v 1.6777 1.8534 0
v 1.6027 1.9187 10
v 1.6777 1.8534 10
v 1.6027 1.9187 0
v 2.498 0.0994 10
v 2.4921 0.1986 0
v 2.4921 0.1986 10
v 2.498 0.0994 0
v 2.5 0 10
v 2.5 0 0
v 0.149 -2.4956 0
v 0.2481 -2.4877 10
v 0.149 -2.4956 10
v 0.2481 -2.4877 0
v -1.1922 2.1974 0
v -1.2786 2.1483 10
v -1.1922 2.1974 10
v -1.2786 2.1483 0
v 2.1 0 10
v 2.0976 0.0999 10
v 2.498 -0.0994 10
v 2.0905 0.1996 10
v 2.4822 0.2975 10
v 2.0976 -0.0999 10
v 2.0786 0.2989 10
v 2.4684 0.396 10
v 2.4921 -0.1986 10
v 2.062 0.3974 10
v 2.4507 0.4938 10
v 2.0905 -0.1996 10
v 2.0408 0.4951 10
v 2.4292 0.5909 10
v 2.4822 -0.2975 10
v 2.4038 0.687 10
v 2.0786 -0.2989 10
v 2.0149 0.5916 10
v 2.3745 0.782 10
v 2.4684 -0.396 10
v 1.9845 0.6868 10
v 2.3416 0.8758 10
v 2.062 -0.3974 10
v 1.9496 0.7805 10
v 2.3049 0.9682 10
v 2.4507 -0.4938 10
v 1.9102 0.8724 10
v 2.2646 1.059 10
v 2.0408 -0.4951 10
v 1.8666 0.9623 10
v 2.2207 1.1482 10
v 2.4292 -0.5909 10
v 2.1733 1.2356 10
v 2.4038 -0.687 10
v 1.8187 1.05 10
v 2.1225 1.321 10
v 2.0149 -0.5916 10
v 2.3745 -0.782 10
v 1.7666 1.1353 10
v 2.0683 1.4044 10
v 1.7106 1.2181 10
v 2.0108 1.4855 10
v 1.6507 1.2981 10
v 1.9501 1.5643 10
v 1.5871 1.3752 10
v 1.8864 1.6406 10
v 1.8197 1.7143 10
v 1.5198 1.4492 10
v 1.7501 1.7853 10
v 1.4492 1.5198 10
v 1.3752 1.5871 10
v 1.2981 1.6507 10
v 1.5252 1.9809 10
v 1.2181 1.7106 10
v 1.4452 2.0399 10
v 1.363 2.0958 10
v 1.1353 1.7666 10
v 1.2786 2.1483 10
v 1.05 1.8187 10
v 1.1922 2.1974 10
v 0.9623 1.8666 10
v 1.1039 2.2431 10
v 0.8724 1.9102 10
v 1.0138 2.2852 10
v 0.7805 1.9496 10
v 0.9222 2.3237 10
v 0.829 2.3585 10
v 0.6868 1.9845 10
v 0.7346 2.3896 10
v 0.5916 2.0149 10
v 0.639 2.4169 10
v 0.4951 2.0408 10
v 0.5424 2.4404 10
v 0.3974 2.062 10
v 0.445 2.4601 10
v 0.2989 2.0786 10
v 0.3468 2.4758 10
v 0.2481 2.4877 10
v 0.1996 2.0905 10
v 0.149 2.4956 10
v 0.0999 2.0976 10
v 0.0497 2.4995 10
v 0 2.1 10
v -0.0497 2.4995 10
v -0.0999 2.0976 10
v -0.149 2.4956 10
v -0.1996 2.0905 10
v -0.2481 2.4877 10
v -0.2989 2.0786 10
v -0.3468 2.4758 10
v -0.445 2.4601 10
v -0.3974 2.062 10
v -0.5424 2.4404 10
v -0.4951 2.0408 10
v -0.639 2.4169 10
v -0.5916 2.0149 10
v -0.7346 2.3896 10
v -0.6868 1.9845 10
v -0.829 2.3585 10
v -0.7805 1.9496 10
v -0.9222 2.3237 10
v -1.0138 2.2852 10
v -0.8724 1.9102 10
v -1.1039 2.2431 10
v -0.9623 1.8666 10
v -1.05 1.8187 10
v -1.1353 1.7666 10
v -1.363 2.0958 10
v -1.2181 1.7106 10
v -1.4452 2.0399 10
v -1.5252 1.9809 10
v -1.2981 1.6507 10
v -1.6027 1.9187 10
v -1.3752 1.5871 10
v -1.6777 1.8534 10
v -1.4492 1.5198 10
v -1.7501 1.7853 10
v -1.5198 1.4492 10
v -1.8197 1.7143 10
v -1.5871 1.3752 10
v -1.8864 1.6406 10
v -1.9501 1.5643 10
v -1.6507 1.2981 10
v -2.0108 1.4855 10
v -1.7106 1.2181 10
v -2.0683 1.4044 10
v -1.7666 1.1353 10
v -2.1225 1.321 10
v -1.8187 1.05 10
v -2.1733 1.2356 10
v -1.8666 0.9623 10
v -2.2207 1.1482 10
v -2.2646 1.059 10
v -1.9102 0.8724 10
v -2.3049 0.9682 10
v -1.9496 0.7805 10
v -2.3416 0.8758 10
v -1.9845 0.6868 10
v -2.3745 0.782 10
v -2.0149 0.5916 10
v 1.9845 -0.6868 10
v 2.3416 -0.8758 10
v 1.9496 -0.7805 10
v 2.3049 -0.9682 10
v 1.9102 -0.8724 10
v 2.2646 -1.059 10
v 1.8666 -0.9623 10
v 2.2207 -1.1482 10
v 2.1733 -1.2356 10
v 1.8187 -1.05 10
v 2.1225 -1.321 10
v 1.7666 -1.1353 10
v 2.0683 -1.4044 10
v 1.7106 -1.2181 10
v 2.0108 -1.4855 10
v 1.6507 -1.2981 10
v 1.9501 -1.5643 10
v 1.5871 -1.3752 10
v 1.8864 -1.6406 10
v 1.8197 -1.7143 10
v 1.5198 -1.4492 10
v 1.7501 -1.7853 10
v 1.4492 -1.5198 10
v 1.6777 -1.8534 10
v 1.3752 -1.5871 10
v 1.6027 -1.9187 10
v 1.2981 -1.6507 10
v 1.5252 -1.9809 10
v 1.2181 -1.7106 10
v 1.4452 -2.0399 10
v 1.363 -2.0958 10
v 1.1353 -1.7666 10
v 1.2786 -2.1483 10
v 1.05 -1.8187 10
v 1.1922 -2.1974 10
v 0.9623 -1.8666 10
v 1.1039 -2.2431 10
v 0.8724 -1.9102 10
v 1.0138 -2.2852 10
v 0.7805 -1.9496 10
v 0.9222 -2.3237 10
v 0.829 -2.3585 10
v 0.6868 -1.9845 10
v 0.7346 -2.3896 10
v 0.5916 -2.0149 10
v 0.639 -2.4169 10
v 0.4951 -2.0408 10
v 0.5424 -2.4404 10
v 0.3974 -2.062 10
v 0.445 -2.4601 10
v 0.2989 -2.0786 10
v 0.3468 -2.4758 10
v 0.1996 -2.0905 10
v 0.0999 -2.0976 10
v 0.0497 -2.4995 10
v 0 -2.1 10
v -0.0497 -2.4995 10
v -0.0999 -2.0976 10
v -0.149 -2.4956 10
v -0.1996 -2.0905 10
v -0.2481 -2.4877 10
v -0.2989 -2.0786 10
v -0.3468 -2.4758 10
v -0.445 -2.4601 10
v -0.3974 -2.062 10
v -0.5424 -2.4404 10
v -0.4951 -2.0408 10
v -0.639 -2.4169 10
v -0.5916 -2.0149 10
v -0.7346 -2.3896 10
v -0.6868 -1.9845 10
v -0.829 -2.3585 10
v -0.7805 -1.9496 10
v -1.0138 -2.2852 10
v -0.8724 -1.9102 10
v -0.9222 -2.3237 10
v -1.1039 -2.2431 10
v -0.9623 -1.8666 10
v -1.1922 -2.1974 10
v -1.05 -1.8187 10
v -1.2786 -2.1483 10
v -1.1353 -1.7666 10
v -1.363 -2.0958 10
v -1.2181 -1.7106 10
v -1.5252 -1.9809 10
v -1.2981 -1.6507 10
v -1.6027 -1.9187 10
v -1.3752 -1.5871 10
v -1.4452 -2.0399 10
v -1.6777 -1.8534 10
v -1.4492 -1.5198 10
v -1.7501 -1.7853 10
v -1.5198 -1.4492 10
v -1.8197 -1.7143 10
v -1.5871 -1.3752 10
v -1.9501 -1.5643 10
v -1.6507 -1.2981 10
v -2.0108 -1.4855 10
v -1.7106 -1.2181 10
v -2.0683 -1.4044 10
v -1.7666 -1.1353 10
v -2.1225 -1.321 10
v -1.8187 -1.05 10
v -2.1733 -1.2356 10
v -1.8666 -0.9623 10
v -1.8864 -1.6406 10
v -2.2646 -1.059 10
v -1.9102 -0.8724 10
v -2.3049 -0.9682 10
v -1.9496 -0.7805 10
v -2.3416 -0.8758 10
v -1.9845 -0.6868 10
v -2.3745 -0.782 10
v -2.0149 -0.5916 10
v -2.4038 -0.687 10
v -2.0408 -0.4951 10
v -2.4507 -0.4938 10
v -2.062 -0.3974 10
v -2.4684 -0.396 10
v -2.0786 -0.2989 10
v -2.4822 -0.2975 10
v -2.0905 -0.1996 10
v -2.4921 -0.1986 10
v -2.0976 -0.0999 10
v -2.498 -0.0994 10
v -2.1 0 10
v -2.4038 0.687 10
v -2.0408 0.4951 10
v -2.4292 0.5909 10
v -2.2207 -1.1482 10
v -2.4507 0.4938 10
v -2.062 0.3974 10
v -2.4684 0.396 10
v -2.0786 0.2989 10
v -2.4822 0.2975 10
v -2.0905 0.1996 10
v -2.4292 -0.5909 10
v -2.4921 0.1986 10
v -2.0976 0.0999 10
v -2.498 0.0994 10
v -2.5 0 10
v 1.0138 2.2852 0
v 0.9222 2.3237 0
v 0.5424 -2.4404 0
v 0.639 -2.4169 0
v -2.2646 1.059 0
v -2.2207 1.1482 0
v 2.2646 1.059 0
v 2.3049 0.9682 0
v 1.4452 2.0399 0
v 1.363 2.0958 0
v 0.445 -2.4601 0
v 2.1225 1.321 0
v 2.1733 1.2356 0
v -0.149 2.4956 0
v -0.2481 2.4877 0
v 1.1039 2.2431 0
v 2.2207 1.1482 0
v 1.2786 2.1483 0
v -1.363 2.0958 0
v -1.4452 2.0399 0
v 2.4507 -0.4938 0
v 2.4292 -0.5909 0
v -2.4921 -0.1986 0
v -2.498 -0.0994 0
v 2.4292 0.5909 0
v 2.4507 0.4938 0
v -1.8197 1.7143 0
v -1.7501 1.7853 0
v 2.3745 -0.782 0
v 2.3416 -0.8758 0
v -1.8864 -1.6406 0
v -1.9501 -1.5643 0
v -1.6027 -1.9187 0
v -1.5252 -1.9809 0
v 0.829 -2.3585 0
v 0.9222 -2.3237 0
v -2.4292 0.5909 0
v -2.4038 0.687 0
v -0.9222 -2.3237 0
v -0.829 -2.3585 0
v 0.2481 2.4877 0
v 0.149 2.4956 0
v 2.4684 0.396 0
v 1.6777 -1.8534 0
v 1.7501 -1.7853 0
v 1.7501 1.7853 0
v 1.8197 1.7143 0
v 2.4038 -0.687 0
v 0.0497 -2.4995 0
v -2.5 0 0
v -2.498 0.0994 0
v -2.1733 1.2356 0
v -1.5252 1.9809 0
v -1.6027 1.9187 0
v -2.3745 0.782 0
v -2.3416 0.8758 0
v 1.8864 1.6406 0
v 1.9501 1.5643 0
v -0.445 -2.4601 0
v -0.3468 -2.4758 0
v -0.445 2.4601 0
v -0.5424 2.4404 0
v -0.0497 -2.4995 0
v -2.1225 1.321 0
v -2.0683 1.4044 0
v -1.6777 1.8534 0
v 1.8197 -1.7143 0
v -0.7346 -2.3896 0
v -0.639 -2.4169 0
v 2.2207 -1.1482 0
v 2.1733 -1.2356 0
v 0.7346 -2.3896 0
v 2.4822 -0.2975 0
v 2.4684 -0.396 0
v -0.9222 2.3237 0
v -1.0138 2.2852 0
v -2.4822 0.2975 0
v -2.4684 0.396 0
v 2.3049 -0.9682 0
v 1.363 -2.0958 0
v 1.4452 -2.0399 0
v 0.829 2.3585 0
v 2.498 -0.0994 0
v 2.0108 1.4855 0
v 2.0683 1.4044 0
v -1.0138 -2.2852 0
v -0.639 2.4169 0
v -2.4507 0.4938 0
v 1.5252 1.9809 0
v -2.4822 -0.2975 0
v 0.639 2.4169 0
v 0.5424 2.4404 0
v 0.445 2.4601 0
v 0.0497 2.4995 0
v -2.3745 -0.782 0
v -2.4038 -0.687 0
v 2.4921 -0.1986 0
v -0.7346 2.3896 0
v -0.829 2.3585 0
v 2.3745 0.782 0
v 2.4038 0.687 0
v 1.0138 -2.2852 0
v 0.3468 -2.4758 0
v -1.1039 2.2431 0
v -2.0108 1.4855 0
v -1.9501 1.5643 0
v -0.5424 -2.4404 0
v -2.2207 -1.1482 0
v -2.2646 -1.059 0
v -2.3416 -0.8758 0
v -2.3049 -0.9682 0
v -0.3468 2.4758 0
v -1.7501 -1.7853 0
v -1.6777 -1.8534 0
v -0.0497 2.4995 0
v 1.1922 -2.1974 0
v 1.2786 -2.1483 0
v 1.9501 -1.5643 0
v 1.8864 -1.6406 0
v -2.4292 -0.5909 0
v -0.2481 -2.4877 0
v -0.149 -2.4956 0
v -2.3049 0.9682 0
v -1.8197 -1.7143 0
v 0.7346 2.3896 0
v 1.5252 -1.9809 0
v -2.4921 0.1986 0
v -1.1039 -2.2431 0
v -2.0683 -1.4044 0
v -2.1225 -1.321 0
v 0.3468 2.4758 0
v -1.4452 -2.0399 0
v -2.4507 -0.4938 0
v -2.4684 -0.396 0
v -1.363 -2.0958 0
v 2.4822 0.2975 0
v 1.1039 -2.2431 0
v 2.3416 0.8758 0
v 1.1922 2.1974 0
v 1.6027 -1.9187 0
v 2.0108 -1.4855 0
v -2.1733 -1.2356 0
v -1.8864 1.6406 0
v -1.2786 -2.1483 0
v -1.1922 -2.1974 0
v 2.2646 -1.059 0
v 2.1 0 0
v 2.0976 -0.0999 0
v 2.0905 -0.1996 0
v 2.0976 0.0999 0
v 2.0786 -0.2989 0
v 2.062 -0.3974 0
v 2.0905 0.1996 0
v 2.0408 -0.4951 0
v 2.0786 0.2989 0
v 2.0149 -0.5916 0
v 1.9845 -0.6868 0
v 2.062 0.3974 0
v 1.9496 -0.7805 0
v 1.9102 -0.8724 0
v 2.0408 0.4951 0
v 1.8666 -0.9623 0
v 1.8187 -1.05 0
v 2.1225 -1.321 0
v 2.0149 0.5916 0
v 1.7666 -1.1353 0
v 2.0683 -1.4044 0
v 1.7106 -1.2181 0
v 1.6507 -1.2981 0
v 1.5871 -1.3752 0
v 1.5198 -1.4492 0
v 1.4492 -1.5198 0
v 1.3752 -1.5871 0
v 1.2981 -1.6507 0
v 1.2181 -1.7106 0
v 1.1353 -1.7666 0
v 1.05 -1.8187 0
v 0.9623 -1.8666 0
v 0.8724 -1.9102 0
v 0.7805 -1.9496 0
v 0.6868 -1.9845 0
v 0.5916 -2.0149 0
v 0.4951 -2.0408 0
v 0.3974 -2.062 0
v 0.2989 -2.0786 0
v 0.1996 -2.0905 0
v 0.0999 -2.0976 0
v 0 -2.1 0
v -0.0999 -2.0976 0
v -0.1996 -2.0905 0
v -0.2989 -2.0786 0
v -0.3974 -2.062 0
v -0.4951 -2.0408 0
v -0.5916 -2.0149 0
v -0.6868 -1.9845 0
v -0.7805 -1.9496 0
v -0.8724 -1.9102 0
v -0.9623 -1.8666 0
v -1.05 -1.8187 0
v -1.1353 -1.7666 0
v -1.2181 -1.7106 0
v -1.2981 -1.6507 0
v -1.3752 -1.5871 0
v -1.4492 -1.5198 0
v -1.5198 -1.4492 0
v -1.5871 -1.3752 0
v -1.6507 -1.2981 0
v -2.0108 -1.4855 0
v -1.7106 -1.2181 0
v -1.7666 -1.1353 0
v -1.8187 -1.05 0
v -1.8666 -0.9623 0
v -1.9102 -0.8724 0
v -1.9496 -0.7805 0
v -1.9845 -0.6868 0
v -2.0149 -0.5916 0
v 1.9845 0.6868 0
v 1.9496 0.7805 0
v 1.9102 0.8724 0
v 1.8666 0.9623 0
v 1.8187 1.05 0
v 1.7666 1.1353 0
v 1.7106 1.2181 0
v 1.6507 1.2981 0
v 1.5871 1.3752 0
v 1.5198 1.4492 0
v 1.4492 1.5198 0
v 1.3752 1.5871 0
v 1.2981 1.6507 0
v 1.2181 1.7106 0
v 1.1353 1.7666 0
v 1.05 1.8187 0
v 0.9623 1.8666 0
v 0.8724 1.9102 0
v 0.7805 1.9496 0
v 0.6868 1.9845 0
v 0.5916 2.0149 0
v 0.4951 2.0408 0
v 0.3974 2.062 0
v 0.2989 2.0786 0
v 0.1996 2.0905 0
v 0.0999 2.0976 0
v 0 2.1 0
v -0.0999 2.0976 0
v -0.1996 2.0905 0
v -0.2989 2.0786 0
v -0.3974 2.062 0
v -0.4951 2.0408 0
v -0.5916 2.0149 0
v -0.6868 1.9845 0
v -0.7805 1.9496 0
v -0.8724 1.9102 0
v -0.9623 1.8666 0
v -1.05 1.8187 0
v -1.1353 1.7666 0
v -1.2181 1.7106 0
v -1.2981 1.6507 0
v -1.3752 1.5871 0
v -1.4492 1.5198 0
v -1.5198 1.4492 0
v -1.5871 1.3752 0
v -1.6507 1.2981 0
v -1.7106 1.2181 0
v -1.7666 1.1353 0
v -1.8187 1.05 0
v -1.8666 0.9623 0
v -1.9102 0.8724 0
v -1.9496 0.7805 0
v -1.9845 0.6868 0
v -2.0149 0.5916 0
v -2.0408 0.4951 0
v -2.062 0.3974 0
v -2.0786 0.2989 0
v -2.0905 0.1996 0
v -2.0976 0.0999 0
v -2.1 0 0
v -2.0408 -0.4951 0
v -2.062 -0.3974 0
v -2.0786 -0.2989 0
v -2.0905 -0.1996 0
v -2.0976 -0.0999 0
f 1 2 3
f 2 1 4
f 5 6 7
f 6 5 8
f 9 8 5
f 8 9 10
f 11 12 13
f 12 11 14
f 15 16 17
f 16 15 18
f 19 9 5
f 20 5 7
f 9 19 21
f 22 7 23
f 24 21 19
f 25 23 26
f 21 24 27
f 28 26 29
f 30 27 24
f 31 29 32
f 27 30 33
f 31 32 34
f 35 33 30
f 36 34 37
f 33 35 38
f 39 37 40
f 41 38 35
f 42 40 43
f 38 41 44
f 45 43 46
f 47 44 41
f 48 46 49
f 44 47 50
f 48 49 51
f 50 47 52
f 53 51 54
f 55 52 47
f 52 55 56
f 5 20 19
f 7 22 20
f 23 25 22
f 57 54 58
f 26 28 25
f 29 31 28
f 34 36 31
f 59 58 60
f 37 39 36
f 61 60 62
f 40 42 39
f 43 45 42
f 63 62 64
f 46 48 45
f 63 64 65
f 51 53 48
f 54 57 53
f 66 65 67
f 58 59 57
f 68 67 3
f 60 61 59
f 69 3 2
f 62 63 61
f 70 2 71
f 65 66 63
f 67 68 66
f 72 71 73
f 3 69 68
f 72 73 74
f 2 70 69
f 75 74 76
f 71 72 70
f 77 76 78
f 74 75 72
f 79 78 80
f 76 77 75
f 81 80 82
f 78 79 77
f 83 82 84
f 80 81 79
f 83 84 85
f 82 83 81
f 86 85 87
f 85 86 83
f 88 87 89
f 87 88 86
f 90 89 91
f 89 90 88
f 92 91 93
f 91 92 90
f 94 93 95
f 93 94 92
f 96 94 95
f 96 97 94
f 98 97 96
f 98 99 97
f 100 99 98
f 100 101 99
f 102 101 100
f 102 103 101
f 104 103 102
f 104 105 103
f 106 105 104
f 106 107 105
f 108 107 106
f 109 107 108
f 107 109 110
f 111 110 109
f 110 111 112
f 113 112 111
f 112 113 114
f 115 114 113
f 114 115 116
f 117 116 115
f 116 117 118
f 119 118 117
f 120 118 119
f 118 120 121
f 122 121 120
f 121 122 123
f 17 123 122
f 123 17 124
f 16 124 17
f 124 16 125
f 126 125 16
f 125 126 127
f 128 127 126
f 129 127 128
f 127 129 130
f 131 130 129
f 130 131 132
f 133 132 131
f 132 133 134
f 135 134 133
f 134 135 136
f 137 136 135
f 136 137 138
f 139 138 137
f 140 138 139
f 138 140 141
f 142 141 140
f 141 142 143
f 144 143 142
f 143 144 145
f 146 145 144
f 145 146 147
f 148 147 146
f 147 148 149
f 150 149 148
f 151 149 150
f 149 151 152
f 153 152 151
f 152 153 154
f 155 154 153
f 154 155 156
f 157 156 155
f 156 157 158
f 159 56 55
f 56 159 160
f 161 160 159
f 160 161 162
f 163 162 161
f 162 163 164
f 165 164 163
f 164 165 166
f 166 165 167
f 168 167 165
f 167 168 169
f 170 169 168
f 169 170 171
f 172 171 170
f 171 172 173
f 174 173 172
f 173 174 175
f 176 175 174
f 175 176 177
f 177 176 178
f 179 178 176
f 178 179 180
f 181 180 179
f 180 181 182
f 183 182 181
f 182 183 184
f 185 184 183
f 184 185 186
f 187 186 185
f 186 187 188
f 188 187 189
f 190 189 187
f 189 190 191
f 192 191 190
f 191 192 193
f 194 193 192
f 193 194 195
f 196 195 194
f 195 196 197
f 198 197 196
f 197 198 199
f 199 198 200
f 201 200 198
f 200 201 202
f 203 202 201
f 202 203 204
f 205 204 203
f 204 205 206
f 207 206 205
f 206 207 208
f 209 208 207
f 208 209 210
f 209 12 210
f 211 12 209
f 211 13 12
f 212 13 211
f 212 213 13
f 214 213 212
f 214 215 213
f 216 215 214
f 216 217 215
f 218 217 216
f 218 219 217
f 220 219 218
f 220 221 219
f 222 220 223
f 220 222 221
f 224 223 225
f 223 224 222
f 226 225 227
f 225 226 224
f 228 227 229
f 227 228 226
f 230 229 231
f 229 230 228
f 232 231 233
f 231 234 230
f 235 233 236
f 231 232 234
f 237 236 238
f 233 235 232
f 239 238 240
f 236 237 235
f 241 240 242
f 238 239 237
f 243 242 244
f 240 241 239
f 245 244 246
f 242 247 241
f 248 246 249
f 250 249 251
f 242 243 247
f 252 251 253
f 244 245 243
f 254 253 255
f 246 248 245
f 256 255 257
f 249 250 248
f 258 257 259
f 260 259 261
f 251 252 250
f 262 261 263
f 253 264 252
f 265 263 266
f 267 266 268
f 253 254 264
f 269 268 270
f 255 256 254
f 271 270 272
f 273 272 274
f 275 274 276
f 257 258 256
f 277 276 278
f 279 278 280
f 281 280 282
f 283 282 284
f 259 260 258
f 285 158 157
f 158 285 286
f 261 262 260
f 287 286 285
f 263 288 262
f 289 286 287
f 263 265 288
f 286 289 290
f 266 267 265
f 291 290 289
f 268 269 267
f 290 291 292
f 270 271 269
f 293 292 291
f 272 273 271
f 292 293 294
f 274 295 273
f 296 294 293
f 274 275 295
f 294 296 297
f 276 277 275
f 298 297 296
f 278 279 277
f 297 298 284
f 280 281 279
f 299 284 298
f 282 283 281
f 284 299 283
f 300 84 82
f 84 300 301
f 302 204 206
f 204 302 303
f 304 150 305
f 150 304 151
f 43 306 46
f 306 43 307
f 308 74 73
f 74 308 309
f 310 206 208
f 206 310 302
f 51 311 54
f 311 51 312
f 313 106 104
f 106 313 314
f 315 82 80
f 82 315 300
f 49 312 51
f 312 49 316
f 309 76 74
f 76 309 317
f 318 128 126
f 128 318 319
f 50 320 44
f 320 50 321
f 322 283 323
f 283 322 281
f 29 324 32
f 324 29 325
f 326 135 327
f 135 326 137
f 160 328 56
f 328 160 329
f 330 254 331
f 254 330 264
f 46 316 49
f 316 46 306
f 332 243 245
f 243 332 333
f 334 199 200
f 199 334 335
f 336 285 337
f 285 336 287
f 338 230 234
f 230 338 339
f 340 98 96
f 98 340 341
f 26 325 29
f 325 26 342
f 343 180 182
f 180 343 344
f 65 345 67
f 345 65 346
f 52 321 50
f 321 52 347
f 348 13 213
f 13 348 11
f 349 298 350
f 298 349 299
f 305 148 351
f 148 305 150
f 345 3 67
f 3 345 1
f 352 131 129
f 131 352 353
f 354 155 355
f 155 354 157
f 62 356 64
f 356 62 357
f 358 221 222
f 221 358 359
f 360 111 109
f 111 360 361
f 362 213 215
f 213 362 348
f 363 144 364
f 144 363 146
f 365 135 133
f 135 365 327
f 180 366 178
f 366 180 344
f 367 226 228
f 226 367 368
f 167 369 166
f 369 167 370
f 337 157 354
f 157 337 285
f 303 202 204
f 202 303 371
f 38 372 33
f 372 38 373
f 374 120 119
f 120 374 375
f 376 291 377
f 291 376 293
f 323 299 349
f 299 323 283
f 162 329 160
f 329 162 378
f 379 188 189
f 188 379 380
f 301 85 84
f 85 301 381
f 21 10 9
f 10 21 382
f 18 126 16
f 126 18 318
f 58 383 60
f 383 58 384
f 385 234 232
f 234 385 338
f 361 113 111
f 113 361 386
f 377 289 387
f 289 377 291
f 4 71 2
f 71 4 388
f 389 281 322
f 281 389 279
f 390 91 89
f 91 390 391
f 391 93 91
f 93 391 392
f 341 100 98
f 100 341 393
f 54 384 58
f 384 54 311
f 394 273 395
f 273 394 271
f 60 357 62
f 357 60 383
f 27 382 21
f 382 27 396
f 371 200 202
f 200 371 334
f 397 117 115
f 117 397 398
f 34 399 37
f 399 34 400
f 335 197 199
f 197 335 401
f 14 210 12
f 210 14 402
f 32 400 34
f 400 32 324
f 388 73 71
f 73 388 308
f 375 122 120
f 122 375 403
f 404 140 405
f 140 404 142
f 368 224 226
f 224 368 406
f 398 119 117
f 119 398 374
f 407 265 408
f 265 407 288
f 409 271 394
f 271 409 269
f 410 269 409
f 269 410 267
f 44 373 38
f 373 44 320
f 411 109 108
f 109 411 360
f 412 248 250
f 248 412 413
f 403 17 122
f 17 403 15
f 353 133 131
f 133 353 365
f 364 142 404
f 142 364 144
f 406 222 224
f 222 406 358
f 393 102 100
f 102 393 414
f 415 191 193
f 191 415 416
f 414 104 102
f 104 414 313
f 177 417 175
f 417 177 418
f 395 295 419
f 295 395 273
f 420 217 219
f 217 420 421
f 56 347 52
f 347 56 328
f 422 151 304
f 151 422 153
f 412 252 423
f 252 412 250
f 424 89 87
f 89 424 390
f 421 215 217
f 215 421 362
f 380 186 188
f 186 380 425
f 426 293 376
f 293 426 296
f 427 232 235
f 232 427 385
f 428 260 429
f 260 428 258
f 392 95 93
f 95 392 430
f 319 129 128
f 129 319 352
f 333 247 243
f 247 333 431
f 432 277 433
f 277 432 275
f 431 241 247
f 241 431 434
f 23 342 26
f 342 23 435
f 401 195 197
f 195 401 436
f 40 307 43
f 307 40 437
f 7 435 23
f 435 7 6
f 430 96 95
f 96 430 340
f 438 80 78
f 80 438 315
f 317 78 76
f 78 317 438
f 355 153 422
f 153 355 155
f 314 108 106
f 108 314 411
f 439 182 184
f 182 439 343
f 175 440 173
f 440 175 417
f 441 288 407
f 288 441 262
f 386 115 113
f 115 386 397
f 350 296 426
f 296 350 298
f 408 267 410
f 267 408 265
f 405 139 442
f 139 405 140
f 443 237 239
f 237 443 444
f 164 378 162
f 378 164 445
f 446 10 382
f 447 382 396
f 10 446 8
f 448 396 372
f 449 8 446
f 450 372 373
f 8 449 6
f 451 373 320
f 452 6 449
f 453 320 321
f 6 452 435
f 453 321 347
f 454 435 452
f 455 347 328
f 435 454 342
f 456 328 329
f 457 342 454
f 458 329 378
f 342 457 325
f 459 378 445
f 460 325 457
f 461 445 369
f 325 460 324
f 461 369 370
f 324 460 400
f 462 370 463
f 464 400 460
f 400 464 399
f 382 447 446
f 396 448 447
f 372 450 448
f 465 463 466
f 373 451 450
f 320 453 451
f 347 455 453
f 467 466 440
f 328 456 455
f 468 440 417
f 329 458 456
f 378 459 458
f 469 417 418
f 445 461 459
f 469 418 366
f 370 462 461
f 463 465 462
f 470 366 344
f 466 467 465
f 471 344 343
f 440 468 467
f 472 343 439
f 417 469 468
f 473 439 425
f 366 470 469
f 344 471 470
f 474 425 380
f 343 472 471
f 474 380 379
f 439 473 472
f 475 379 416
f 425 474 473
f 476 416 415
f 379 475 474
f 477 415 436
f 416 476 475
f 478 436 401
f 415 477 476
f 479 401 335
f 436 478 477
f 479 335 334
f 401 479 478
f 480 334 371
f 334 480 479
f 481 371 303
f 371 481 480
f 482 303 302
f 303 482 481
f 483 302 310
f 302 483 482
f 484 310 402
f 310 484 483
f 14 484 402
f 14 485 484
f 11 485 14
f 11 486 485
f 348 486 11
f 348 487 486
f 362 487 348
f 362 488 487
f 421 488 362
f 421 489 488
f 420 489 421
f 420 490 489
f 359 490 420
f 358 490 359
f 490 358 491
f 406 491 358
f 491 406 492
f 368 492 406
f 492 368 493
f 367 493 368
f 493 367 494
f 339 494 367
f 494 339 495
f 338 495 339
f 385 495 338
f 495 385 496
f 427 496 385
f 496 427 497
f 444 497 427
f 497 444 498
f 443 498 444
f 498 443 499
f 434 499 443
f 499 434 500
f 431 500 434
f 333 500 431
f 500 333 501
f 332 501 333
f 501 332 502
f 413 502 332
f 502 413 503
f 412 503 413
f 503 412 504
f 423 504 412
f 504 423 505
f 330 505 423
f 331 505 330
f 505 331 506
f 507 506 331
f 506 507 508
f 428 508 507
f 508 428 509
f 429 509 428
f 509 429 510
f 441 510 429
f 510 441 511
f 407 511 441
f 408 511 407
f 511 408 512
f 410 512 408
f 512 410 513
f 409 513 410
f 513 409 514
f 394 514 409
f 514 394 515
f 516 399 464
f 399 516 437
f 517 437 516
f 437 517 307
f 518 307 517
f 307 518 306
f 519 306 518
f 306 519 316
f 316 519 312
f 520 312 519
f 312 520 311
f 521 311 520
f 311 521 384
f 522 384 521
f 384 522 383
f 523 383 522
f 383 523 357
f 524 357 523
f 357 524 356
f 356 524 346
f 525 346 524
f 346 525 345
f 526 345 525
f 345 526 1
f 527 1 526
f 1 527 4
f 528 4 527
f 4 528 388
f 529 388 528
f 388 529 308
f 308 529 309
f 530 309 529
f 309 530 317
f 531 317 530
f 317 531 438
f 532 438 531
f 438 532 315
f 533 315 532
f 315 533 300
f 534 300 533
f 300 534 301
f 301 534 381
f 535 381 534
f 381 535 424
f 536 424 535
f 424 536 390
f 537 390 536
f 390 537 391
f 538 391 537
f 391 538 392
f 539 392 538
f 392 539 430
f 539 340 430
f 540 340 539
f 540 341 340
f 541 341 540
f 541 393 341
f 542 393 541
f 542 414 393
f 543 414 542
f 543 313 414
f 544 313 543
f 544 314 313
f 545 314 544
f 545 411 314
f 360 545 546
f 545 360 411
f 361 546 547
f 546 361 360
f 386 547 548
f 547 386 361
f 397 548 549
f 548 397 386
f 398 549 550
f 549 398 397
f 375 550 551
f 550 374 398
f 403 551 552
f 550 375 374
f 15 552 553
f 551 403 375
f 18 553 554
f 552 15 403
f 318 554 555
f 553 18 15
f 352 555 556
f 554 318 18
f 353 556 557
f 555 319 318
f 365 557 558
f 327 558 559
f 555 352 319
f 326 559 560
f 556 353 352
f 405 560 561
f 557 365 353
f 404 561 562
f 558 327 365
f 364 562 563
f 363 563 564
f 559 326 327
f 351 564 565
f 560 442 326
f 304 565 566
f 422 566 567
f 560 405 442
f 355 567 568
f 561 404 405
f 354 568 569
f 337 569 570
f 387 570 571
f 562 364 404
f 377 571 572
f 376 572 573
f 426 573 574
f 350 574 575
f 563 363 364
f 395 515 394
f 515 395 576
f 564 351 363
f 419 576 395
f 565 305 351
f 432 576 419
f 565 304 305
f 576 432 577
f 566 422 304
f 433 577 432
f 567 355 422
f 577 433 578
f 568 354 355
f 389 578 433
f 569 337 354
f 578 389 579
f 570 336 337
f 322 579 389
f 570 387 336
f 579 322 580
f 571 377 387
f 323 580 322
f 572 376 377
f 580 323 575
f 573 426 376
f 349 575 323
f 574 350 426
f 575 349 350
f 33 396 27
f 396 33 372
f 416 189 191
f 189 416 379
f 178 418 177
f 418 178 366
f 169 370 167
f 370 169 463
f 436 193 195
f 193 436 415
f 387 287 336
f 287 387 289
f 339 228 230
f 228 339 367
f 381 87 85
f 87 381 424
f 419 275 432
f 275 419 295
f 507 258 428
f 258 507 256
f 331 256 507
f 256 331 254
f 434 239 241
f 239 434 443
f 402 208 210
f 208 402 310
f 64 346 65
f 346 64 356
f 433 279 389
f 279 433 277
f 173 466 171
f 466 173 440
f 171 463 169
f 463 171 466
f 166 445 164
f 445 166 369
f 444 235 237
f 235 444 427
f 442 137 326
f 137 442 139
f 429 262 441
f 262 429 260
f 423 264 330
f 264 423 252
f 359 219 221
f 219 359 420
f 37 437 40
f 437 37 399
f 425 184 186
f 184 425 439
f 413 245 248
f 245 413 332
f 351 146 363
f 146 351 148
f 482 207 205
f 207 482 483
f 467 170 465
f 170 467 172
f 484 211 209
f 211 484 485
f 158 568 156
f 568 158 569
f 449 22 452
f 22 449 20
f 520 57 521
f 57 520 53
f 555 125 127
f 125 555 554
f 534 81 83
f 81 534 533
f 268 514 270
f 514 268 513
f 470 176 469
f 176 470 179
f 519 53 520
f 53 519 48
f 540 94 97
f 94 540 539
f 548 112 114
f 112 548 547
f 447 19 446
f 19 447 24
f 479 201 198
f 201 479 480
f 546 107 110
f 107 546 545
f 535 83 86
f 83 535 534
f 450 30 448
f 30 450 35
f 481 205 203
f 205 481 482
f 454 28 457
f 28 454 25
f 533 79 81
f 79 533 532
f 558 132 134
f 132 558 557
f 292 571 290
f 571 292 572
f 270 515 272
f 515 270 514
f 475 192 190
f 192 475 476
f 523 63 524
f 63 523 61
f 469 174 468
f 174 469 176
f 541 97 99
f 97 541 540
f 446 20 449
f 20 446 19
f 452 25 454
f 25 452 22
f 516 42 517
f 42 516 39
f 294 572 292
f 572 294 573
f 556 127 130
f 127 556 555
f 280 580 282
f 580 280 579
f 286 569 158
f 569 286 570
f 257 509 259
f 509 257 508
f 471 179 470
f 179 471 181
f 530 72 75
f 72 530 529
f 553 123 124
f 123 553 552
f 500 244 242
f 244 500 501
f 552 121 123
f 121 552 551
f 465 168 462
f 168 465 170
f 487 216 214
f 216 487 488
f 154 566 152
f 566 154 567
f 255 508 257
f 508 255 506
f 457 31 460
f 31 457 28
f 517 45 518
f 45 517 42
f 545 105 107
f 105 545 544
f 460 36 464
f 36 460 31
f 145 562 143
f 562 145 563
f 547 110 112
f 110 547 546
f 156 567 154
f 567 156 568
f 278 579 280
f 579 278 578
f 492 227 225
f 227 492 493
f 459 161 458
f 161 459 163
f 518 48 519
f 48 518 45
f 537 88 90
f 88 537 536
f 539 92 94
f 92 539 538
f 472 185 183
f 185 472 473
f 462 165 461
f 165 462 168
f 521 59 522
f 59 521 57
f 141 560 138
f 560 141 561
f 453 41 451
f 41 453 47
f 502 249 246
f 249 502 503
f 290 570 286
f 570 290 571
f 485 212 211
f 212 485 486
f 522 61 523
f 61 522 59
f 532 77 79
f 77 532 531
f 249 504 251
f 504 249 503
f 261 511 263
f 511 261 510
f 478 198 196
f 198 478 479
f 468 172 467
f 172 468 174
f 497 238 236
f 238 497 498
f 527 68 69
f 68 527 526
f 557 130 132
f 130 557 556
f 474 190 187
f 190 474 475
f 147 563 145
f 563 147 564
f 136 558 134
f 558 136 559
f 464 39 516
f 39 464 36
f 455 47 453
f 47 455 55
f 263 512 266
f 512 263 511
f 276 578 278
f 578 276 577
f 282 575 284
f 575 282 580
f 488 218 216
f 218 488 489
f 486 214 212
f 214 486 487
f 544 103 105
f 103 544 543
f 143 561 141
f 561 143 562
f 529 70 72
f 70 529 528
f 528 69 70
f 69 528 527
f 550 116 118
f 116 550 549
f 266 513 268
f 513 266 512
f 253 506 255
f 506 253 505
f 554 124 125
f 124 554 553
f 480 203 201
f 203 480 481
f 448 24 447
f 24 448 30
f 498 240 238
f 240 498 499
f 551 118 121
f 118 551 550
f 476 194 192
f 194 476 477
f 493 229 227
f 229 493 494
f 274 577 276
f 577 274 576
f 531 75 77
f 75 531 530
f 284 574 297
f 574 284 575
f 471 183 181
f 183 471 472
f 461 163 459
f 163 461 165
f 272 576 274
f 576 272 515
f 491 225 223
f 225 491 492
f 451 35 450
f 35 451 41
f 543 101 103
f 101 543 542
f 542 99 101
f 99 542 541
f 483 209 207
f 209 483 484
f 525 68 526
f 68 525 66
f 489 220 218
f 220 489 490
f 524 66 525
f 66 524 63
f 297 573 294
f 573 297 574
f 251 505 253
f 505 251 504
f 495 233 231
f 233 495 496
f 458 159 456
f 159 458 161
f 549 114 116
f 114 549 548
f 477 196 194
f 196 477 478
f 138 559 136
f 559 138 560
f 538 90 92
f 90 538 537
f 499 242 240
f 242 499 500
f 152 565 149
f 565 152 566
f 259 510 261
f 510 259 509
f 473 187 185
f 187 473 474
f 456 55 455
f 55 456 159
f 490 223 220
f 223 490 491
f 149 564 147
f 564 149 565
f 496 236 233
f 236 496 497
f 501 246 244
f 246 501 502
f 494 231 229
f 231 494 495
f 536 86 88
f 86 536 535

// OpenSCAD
// -*- mode: SCAD ; c-file-style: "ellemtel" ; coding: utf-8 -*-
//
// Buchse (bushing)
//
// © 2017 Roland Sieker <ospalh@gmail.com>
// Licence: CC-0 4.0

d_i = 4.2;
d_a = 5;
h = 10;

preview = false;

ms = 0.1;  // Muggeseggele



pa = 5;
ps = 1;
ra = 1;
rs = 0.1;
function na() = (preview) ? pna : rna;
function nb() = (preview) ? pnb : rnb;
$fs = (preview) ? ps : rs;
$fa = (preview) ? pa : ra;



difference()
{
    cylinder(d=d_a, h=h);
    translate([0,0,-ms])
    {
        cylinder(d=d_i, h=h+2*ms);
    }
}
